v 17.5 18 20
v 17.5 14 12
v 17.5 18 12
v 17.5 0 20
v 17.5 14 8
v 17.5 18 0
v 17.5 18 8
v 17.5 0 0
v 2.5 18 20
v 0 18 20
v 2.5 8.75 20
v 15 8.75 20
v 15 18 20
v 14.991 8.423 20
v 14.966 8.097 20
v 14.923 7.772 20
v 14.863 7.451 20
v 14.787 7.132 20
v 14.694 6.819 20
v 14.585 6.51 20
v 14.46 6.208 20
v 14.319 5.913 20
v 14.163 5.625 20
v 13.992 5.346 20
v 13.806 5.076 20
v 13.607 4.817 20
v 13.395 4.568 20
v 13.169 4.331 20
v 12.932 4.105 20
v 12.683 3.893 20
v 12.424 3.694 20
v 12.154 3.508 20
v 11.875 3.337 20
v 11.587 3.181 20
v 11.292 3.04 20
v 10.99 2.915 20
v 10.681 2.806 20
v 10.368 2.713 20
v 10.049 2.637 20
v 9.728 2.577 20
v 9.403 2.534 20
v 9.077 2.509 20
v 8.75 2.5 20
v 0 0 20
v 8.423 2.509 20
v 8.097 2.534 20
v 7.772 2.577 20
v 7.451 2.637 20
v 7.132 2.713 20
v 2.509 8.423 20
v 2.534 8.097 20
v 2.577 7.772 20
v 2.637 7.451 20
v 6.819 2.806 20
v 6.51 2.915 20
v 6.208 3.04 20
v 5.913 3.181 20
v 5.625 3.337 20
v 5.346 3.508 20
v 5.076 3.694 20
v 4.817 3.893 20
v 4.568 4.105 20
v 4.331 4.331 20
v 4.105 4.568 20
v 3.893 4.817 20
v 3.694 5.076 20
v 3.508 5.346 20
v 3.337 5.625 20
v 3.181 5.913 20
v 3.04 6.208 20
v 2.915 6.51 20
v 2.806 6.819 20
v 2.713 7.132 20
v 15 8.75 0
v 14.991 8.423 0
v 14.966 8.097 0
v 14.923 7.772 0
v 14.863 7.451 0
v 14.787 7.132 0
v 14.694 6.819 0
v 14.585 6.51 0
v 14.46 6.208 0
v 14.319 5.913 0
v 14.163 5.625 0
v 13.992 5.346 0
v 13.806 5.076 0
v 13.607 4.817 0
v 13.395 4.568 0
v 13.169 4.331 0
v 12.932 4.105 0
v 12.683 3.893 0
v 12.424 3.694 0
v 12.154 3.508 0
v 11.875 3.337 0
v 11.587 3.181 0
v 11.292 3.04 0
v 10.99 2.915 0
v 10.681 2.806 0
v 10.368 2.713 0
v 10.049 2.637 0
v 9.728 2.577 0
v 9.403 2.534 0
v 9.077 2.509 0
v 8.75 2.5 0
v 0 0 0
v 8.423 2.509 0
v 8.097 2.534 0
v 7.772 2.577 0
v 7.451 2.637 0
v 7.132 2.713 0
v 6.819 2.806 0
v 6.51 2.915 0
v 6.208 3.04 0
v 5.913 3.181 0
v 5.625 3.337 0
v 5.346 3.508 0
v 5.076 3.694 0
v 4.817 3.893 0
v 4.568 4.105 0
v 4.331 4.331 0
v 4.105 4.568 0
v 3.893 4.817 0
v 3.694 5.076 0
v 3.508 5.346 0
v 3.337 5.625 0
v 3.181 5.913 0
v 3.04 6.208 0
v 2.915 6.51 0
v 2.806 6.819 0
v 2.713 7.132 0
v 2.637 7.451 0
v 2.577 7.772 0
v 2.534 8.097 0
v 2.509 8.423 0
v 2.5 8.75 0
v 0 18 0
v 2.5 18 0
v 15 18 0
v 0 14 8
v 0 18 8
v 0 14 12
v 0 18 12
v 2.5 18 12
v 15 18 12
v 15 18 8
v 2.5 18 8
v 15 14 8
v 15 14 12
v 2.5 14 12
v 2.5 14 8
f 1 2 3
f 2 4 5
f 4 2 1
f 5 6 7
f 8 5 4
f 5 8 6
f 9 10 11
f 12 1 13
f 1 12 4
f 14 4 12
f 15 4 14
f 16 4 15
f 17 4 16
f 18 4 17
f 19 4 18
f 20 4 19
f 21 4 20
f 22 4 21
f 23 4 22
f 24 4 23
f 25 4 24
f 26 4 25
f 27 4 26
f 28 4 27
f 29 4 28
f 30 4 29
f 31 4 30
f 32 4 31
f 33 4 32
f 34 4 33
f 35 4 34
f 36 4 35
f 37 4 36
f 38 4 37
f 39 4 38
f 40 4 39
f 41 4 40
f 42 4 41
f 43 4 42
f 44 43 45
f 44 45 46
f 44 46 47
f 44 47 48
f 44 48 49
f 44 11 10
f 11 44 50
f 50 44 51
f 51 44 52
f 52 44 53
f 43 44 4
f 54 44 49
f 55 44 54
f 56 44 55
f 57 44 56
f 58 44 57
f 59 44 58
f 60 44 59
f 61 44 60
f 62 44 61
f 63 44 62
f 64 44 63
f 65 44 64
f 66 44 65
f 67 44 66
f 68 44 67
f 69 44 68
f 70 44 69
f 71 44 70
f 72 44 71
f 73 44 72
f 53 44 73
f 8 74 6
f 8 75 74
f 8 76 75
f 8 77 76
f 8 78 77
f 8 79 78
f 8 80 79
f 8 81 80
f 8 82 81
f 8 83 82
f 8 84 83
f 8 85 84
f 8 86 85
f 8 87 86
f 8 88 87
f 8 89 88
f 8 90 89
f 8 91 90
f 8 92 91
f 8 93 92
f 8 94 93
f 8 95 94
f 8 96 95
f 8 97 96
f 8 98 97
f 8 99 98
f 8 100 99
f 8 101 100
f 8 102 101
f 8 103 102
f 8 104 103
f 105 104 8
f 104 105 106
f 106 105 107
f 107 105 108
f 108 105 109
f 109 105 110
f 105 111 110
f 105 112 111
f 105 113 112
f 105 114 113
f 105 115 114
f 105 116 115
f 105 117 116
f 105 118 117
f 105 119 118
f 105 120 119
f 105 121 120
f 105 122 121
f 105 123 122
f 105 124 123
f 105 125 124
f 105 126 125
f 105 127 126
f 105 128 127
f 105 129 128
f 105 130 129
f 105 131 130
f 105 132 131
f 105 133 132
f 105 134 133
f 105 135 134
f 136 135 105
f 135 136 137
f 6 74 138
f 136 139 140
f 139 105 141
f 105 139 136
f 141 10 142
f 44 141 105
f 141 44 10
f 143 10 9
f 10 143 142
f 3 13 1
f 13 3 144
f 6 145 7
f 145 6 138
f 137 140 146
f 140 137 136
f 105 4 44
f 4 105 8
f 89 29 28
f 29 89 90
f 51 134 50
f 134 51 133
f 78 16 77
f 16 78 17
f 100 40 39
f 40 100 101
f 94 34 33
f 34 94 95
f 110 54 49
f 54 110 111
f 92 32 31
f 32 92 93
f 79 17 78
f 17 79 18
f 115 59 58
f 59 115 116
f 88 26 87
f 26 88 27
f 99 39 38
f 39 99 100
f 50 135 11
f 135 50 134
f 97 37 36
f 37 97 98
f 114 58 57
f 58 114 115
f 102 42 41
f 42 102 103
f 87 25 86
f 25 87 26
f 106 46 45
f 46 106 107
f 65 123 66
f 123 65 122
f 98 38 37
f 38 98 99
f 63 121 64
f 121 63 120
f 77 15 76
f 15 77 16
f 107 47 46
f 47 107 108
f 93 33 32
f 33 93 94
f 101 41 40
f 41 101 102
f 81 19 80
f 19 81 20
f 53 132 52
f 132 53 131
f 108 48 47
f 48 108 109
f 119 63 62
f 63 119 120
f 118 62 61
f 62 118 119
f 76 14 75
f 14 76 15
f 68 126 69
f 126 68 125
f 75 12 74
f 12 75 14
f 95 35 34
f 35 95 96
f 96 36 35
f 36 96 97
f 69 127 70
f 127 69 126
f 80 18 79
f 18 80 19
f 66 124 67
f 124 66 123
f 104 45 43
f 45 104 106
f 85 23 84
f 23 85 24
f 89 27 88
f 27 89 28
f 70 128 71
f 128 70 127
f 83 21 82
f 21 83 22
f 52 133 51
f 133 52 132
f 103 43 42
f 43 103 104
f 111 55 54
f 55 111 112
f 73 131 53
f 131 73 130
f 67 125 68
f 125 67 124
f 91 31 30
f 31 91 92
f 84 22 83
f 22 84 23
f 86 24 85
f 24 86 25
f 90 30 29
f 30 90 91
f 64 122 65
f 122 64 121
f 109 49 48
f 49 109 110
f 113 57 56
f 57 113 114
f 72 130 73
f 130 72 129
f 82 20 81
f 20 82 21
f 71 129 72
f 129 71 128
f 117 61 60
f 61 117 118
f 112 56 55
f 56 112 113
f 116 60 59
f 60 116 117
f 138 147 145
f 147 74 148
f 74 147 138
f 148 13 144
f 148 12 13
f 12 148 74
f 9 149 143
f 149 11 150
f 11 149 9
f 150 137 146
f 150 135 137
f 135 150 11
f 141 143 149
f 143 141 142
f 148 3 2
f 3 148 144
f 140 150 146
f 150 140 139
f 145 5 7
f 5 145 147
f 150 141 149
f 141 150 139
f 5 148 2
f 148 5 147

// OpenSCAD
$fn=120;

external=17.5;
internal=12.5;
height=20;
width=18;
holeWidth=4;
holeHeight=4;

shift = (external - internal) / 2;

difference() {
  cube([external, width, height]);
  translate([shift+internal/2,shift+internal/2,-0.01]) cylinder(d=internal, h=height+2 );
  translate([shift,shift+internal/2,-0.01]) cube([internal, internal, height+2]);
  translate([-1,width-holeHeight,(height-holeWidth)/2]) cube([external+2, holeHeight, holeWidth]);

}
